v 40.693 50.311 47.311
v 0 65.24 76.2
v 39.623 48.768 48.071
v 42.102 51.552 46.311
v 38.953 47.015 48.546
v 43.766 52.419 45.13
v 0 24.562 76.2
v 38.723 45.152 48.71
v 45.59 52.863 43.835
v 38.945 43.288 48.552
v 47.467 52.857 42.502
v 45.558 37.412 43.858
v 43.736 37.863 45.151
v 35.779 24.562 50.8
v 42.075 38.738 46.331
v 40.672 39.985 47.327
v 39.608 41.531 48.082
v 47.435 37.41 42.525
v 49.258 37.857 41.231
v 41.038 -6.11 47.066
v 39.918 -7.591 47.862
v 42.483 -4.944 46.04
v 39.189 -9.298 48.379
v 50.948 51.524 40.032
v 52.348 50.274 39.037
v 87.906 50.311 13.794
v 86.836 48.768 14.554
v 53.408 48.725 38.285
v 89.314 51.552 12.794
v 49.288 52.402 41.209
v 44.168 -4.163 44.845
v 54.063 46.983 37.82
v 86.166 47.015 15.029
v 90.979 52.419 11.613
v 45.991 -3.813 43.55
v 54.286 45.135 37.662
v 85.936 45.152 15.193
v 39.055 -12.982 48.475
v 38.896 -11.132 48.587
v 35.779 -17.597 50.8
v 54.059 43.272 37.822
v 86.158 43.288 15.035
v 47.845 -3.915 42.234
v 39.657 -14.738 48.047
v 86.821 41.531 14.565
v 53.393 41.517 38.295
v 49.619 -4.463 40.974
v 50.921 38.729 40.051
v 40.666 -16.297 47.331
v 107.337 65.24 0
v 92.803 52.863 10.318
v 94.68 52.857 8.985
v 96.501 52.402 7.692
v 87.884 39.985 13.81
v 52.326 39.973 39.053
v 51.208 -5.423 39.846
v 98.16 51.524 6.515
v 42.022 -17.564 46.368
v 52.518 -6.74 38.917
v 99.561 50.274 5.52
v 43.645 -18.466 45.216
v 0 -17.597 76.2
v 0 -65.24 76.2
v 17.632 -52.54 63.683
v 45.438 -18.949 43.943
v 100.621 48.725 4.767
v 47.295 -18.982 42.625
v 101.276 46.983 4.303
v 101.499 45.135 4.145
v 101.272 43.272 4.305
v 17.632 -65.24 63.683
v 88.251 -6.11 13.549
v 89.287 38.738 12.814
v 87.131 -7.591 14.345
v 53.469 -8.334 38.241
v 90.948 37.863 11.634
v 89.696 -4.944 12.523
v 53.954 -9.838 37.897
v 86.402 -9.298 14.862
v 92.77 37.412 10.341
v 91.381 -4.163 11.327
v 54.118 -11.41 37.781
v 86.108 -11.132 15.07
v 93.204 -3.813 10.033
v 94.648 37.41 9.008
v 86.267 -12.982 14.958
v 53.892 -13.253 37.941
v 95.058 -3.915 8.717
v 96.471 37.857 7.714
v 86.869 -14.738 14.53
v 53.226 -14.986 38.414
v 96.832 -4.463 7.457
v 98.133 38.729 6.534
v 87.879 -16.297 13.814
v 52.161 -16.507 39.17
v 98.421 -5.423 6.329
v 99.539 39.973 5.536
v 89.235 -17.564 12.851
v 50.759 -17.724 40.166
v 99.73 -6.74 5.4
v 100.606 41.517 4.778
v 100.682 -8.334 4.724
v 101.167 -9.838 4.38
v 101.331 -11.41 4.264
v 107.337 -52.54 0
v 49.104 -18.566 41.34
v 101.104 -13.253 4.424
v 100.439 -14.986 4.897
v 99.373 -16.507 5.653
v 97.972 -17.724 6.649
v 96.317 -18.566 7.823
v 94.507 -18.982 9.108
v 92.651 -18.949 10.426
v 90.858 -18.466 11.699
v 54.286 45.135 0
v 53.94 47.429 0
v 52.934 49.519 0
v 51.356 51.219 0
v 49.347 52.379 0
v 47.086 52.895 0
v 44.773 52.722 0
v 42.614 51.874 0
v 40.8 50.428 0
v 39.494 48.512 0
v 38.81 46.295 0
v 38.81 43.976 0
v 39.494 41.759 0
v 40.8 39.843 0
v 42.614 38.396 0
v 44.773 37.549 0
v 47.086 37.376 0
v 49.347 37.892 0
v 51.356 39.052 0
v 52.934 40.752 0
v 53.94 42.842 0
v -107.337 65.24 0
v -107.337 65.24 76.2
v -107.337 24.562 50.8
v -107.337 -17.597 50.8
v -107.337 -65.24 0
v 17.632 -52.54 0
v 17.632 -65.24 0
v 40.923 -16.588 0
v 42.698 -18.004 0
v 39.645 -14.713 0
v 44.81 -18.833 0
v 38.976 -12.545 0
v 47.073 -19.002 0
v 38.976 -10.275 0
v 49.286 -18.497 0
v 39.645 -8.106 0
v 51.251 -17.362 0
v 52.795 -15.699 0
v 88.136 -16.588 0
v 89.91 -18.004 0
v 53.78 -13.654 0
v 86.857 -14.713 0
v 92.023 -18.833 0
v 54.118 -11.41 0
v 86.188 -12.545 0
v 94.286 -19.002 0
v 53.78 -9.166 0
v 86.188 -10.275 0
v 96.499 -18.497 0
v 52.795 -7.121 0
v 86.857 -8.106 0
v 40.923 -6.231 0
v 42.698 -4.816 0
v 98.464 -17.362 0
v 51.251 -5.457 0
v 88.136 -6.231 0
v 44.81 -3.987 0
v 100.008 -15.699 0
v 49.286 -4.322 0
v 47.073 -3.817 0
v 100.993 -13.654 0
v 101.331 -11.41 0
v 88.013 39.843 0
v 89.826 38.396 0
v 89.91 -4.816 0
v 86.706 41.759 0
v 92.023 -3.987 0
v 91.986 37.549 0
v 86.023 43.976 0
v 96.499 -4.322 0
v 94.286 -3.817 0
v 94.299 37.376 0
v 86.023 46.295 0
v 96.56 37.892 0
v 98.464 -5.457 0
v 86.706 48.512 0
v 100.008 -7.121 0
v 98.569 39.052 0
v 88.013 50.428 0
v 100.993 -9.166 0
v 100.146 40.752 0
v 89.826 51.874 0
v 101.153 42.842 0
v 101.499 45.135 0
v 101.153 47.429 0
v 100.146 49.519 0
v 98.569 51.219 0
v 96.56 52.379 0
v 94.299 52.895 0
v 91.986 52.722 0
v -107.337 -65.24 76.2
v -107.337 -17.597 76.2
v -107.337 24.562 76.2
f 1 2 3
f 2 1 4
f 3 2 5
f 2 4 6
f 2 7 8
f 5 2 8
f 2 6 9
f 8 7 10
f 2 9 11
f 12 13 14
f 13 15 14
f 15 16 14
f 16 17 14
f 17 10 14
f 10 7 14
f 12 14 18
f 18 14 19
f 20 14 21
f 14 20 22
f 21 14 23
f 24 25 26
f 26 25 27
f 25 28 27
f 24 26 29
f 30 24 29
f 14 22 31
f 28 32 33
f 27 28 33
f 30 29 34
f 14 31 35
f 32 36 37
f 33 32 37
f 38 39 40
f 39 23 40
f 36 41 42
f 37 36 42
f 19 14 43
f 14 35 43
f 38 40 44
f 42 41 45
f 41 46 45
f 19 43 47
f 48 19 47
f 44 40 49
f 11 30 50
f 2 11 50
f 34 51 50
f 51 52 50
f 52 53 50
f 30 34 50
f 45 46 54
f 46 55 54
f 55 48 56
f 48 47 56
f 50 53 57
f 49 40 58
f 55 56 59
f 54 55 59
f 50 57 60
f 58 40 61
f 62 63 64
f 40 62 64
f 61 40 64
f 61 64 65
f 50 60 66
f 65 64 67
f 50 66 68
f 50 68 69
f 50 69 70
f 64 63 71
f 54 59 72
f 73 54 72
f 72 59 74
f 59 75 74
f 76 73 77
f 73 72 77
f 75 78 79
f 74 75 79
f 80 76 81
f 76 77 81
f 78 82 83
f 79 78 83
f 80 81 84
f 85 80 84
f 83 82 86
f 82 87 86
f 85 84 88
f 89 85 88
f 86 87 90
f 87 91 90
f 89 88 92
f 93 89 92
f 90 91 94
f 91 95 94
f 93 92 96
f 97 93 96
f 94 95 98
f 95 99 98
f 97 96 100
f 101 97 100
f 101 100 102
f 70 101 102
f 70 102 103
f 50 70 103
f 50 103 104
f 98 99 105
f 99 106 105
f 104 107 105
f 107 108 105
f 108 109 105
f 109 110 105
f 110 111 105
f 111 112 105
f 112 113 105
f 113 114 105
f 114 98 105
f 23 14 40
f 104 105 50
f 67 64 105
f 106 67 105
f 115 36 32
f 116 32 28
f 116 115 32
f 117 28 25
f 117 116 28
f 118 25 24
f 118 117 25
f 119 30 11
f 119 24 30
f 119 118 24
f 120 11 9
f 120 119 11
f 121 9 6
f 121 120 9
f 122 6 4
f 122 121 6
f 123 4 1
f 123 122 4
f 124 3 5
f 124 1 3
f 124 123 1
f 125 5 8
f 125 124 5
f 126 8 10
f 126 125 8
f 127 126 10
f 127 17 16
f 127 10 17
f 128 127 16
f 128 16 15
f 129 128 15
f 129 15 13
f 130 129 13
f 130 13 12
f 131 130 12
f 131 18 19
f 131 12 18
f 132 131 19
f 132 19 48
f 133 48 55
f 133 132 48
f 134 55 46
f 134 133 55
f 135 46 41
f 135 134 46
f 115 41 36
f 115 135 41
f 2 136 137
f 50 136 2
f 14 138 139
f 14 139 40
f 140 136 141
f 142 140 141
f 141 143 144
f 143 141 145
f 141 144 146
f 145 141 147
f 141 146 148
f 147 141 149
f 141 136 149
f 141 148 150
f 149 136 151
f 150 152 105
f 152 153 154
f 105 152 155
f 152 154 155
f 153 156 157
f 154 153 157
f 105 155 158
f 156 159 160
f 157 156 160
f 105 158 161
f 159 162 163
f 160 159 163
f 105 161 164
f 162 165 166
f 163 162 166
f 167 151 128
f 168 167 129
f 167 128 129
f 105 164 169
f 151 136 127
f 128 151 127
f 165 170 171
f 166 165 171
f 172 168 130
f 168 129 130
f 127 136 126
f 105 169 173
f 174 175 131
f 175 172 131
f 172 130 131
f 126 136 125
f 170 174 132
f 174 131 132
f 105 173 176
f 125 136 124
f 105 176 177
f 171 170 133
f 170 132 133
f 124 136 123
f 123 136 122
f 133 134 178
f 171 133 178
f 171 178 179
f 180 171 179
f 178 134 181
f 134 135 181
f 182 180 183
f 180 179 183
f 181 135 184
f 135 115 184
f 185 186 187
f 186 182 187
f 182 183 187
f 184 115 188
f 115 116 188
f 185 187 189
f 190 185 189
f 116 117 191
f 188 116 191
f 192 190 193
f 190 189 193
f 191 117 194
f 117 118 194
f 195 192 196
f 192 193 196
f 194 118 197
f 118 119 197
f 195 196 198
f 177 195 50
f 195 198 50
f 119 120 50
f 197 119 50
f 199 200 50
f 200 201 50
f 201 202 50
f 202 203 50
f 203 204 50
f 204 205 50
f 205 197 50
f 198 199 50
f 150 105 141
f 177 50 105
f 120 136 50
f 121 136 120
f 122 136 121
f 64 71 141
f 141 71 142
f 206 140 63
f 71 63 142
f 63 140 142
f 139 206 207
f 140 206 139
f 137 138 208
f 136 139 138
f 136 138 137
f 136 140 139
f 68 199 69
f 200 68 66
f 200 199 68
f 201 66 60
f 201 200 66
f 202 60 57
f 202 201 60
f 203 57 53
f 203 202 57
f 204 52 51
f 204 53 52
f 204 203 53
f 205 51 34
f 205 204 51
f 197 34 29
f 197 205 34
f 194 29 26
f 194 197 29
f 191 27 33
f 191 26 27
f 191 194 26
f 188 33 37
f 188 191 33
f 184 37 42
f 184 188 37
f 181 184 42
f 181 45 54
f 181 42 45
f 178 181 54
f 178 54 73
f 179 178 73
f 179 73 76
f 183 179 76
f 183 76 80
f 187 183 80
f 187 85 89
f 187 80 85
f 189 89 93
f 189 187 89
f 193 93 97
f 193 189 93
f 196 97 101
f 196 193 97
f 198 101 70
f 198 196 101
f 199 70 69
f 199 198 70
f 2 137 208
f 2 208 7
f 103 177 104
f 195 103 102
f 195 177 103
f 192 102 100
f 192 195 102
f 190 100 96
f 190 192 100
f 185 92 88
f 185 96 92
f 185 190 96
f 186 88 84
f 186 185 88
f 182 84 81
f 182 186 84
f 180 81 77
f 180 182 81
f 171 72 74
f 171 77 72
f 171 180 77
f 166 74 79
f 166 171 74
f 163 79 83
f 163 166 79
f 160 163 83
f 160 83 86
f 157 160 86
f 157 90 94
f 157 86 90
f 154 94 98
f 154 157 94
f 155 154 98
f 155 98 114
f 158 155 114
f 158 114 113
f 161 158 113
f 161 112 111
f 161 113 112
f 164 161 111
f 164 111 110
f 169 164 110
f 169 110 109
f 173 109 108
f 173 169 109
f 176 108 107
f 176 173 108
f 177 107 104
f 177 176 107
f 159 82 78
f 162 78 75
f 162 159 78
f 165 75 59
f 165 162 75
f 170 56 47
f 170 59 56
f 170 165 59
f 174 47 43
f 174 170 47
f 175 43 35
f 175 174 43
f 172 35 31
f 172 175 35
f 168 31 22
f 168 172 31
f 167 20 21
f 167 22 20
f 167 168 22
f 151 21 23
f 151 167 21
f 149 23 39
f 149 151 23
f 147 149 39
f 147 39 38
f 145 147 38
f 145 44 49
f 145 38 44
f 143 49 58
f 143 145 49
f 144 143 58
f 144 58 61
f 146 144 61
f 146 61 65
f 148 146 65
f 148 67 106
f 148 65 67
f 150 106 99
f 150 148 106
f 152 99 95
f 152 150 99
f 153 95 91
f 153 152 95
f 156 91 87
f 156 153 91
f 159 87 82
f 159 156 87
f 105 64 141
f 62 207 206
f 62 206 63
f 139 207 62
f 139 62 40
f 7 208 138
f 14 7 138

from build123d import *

# Parameters (mm, degrees)
F0_W      = 214.6737128496
F0_H      = 130.4792463779
F1_DEPTH  = 76.2
F3_DEPTH  = 2540
F4_W      = 107.3368564248
F4_H      = 42.1587638557
F5_DEPTH  = 25.4
F6_W      = 42.1587638557
F6_H      = 25.4
F7_DEPTH  = 25.4
F8_DEPTH  = 25.4
F10_DEPTH = 12.7
F11_R     = 7.7814226796
F11_R_2   = 7.6137292191
F12_DEPTH = 76.201


with BuildPart() as f1:
    # F0 (on Top) → F1 (new body)
    with BuildSketch(Plane.XY):
        Rectangle(F0_W, F0_H)
    extrude(amount=F1_DEPTH)

    # F2 (on face) → F3 (cut)
    with BuildSketch(Plane.XZ.offset(65.239623189)):
        Polygon((107.3368564248, 76.2), (0, 76.2), (107.3368564248, 0), align=None)
    extrude(amount=-F3_DEPTH, mode=Mode.SUBTRACT)

    # F4 (on face) → F5 (cut)
    with BuildSketch(Plane.XY.offset(76.2)):
        with Locations((-53.6684282124, 3.4826807678)):
            Rectangle(F4_W, F4_H)
    extrude(amount=-F5_DEPTH, mode=Mode.SUBTRACT)

    # F6 (on face) → F7 (cut)
    with BuildSketch(Plane(origin=(0, 0, 0), x_dir=(0, -1, 0), z_dir=(-1, 0, 0))):
        with Locations((-3.4826807678, 63.5)):
            Rectangle(F6_W, F6_H)
    extrude(amount=-F7_DEPTH, mode=Mode.SUBTRACT)

    # F8 (cut): a face of the model
    f8_faces = [f1.faces().sort_by_distance(p)[0] for p in [
        (25.4, 3.4826807678, 54.4840847568),
    ]]
    extrude(f8_faces, amount=-F8_DEPTH, mode=Mode.SUBTRACT)

    # F9 (on face) → F10 (cut)
    with BuildSketch(Plane.XZ.offset(65.239623189)):
        Polygon((107.3368564248, 0), (17.6323605159, 63.6825300827), (17.6323605159, 0), align=None)
    extrude(amount=-F10_DEPTH, mode=Mode.SUBTRACT)

    # F11 (on Top) → F12 (cut, through all)
    with BuildSketch(Plane.XY):
        with Locations((46.5043671429, 45.1353924804)):
            Circle(F11_R)
        with Locations((46.5043671429, -11.4098191261)):
            Circle(F11_R_2)
        with Locations((93.7171405072, -11.4098191261)):
            Circle(F11_R_2)
        with Locations((93.7171405072, 45.1353924804)):
            Circle(F11_R)
    extrude(amount=F12_DEPTH, mode=Mode.SUBTRACT)


solid = f1.part
